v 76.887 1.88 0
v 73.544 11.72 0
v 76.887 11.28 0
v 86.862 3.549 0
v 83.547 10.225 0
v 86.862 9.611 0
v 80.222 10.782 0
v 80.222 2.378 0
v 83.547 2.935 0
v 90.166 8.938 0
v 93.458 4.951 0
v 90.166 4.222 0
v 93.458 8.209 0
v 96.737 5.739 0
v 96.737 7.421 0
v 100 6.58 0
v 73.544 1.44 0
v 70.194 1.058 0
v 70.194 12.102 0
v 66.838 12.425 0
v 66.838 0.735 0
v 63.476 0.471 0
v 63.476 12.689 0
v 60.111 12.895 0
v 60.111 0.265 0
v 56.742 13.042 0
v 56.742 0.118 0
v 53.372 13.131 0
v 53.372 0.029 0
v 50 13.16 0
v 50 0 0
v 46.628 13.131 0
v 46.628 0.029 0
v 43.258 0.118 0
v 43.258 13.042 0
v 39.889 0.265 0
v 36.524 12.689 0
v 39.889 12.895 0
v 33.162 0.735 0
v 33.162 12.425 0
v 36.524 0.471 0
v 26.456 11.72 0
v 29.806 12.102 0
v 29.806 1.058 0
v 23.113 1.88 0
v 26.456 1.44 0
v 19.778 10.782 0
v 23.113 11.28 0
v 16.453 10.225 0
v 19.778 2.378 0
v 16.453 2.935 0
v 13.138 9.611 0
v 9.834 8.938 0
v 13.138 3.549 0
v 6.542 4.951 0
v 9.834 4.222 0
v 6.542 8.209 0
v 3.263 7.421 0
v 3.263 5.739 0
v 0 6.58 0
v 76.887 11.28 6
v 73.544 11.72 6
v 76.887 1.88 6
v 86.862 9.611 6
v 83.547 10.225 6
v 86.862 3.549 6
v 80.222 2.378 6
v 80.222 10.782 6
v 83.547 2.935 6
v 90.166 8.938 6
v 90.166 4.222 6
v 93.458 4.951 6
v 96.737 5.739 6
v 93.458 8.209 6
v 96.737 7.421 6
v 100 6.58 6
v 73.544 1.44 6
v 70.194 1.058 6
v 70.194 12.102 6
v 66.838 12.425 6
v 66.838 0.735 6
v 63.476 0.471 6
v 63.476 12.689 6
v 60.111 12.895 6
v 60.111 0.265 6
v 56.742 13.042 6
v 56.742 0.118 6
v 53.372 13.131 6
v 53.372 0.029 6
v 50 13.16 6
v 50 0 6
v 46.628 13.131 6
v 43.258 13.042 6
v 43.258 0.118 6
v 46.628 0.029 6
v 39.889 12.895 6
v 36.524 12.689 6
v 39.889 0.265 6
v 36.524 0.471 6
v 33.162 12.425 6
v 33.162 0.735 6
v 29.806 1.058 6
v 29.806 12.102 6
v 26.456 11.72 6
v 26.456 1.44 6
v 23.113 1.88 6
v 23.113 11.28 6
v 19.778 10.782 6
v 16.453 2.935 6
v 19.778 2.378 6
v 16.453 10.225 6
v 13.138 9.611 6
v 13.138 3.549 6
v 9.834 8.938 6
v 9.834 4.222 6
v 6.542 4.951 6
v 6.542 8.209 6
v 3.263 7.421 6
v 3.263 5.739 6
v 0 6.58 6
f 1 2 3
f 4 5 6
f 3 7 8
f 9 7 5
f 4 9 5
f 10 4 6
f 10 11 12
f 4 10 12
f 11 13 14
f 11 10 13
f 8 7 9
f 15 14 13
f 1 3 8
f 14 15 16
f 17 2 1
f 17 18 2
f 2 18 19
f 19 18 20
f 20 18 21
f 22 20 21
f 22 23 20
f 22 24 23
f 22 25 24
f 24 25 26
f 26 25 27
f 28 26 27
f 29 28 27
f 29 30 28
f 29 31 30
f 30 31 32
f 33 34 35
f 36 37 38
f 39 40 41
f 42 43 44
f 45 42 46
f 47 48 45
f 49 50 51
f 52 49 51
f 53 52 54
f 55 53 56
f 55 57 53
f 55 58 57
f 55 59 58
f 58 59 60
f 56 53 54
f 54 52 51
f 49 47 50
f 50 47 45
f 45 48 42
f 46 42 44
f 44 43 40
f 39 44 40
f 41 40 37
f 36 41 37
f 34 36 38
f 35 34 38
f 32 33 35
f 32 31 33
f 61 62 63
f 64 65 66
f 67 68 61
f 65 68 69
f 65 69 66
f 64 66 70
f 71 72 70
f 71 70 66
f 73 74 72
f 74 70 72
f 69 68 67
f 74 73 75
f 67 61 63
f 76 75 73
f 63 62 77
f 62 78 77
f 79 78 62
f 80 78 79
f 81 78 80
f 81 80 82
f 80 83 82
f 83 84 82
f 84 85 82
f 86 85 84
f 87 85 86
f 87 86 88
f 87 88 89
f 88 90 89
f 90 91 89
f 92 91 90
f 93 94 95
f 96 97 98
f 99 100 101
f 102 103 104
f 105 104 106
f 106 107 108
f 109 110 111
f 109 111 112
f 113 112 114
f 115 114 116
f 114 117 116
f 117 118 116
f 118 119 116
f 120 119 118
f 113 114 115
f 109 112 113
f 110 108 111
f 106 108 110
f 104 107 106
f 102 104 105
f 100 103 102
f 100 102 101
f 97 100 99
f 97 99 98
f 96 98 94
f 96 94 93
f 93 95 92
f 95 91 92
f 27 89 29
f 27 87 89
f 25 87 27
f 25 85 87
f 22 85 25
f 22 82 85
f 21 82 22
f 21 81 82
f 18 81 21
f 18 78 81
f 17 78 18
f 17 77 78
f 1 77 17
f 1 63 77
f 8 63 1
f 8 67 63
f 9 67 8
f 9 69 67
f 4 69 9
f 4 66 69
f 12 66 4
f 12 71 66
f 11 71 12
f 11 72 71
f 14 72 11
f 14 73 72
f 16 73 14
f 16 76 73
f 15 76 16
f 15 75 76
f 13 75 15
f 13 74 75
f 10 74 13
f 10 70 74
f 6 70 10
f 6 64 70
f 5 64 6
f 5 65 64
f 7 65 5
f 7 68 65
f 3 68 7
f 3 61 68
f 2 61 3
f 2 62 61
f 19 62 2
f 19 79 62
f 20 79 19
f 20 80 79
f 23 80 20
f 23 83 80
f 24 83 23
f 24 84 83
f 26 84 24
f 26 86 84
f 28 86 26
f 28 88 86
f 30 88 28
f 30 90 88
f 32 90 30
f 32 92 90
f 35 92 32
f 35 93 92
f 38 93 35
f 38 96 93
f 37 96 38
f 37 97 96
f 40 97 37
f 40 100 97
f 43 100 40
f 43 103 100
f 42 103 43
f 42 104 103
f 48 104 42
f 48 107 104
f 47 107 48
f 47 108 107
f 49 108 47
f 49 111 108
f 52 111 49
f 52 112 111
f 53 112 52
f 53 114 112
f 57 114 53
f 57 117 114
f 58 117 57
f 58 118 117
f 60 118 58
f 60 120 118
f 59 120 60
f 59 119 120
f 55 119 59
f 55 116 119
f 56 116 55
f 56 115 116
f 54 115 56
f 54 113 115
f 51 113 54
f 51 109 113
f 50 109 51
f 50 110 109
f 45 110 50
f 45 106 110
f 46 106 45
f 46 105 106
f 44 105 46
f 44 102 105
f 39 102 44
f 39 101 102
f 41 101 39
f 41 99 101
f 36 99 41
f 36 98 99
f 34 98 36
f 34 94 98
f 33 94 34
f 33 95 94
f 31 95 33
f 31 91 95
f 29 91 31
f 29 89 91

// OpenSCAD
$fn = 32;

// ----------------------------------------------------------------------
// Arc profile plate: lens, 60 points
// ----------------------------------------------------------------------

// --- parameters (mm) ---
lens_chord = 100;         // chord length of the lens, X
arc_r = 193.19;           // radius of both arcs
arc_angle = 30;           // angle of each arc, degrees
sagitta = 6.58;           // bulge of each arc (half the lens height)
arc_step = 1;             // sampling step of the arcs, degrees
plate_t = 6;              // plate thickness, Z

bbox_y = 2 * sagitta;  // full lens height

profile = [[100, 6.58], [96.737, 7.421], [93.458, 8.209], [90.166, 8.938], [86.862, 9.611], [83.547, 10.225], [80.222, 10.782], [76.887, 11.28], [73.544, 11.72], [70.194, 12.102], [66.838, 12.425], [63.476, 12.689], [60.111, 12.895], [56.742, 13.042], [53.372, 13.131], [50, 13.16], [46.628, 13.131], [43.258, 13.042], [39.889, 12.895], [36.524, 12.689], [33.162, 12.425], [29.806, 12.102], [26.456, 11.72], [23.113, 11.28], [19.778, 10.782], [16.453, 10.225], [13.138, 9.611], [9.834, 8.938], [6.542, 8.209], [3.263, 7.421], [0, 6.58], [3.263, 5.739], [6.542, 4.951], [9.834, 4.222], [13.138, 3.549], [16.453, 2.935], [19.778, 2.378], [23.113, 1.88], [26.456, 1.44], [29.806, 1.058], [33.162, 0.735], [36.524, 0.471], [39.889, 0.265], [43.258, 0.118], [46.628, 0.029], [50, 0], [53.372, 0.029], [56.742, 0.118], [60.111, 0.265], [63.476, 0.471], [66.838, 0.735], [70.194, 1.058], [73.544, 1.44], [76.887, 1.88], [80.222, 2.378], [83.547, 2.935], [86.862, 3.549], [90.166, 4.222], [93.458, 4.951], [96.737, 5.739]];  // primary outline, 60 points, counter clockwise

// --- the one profile operation ---
linear_extrude(height = plate_t) polygon(points = profile);
